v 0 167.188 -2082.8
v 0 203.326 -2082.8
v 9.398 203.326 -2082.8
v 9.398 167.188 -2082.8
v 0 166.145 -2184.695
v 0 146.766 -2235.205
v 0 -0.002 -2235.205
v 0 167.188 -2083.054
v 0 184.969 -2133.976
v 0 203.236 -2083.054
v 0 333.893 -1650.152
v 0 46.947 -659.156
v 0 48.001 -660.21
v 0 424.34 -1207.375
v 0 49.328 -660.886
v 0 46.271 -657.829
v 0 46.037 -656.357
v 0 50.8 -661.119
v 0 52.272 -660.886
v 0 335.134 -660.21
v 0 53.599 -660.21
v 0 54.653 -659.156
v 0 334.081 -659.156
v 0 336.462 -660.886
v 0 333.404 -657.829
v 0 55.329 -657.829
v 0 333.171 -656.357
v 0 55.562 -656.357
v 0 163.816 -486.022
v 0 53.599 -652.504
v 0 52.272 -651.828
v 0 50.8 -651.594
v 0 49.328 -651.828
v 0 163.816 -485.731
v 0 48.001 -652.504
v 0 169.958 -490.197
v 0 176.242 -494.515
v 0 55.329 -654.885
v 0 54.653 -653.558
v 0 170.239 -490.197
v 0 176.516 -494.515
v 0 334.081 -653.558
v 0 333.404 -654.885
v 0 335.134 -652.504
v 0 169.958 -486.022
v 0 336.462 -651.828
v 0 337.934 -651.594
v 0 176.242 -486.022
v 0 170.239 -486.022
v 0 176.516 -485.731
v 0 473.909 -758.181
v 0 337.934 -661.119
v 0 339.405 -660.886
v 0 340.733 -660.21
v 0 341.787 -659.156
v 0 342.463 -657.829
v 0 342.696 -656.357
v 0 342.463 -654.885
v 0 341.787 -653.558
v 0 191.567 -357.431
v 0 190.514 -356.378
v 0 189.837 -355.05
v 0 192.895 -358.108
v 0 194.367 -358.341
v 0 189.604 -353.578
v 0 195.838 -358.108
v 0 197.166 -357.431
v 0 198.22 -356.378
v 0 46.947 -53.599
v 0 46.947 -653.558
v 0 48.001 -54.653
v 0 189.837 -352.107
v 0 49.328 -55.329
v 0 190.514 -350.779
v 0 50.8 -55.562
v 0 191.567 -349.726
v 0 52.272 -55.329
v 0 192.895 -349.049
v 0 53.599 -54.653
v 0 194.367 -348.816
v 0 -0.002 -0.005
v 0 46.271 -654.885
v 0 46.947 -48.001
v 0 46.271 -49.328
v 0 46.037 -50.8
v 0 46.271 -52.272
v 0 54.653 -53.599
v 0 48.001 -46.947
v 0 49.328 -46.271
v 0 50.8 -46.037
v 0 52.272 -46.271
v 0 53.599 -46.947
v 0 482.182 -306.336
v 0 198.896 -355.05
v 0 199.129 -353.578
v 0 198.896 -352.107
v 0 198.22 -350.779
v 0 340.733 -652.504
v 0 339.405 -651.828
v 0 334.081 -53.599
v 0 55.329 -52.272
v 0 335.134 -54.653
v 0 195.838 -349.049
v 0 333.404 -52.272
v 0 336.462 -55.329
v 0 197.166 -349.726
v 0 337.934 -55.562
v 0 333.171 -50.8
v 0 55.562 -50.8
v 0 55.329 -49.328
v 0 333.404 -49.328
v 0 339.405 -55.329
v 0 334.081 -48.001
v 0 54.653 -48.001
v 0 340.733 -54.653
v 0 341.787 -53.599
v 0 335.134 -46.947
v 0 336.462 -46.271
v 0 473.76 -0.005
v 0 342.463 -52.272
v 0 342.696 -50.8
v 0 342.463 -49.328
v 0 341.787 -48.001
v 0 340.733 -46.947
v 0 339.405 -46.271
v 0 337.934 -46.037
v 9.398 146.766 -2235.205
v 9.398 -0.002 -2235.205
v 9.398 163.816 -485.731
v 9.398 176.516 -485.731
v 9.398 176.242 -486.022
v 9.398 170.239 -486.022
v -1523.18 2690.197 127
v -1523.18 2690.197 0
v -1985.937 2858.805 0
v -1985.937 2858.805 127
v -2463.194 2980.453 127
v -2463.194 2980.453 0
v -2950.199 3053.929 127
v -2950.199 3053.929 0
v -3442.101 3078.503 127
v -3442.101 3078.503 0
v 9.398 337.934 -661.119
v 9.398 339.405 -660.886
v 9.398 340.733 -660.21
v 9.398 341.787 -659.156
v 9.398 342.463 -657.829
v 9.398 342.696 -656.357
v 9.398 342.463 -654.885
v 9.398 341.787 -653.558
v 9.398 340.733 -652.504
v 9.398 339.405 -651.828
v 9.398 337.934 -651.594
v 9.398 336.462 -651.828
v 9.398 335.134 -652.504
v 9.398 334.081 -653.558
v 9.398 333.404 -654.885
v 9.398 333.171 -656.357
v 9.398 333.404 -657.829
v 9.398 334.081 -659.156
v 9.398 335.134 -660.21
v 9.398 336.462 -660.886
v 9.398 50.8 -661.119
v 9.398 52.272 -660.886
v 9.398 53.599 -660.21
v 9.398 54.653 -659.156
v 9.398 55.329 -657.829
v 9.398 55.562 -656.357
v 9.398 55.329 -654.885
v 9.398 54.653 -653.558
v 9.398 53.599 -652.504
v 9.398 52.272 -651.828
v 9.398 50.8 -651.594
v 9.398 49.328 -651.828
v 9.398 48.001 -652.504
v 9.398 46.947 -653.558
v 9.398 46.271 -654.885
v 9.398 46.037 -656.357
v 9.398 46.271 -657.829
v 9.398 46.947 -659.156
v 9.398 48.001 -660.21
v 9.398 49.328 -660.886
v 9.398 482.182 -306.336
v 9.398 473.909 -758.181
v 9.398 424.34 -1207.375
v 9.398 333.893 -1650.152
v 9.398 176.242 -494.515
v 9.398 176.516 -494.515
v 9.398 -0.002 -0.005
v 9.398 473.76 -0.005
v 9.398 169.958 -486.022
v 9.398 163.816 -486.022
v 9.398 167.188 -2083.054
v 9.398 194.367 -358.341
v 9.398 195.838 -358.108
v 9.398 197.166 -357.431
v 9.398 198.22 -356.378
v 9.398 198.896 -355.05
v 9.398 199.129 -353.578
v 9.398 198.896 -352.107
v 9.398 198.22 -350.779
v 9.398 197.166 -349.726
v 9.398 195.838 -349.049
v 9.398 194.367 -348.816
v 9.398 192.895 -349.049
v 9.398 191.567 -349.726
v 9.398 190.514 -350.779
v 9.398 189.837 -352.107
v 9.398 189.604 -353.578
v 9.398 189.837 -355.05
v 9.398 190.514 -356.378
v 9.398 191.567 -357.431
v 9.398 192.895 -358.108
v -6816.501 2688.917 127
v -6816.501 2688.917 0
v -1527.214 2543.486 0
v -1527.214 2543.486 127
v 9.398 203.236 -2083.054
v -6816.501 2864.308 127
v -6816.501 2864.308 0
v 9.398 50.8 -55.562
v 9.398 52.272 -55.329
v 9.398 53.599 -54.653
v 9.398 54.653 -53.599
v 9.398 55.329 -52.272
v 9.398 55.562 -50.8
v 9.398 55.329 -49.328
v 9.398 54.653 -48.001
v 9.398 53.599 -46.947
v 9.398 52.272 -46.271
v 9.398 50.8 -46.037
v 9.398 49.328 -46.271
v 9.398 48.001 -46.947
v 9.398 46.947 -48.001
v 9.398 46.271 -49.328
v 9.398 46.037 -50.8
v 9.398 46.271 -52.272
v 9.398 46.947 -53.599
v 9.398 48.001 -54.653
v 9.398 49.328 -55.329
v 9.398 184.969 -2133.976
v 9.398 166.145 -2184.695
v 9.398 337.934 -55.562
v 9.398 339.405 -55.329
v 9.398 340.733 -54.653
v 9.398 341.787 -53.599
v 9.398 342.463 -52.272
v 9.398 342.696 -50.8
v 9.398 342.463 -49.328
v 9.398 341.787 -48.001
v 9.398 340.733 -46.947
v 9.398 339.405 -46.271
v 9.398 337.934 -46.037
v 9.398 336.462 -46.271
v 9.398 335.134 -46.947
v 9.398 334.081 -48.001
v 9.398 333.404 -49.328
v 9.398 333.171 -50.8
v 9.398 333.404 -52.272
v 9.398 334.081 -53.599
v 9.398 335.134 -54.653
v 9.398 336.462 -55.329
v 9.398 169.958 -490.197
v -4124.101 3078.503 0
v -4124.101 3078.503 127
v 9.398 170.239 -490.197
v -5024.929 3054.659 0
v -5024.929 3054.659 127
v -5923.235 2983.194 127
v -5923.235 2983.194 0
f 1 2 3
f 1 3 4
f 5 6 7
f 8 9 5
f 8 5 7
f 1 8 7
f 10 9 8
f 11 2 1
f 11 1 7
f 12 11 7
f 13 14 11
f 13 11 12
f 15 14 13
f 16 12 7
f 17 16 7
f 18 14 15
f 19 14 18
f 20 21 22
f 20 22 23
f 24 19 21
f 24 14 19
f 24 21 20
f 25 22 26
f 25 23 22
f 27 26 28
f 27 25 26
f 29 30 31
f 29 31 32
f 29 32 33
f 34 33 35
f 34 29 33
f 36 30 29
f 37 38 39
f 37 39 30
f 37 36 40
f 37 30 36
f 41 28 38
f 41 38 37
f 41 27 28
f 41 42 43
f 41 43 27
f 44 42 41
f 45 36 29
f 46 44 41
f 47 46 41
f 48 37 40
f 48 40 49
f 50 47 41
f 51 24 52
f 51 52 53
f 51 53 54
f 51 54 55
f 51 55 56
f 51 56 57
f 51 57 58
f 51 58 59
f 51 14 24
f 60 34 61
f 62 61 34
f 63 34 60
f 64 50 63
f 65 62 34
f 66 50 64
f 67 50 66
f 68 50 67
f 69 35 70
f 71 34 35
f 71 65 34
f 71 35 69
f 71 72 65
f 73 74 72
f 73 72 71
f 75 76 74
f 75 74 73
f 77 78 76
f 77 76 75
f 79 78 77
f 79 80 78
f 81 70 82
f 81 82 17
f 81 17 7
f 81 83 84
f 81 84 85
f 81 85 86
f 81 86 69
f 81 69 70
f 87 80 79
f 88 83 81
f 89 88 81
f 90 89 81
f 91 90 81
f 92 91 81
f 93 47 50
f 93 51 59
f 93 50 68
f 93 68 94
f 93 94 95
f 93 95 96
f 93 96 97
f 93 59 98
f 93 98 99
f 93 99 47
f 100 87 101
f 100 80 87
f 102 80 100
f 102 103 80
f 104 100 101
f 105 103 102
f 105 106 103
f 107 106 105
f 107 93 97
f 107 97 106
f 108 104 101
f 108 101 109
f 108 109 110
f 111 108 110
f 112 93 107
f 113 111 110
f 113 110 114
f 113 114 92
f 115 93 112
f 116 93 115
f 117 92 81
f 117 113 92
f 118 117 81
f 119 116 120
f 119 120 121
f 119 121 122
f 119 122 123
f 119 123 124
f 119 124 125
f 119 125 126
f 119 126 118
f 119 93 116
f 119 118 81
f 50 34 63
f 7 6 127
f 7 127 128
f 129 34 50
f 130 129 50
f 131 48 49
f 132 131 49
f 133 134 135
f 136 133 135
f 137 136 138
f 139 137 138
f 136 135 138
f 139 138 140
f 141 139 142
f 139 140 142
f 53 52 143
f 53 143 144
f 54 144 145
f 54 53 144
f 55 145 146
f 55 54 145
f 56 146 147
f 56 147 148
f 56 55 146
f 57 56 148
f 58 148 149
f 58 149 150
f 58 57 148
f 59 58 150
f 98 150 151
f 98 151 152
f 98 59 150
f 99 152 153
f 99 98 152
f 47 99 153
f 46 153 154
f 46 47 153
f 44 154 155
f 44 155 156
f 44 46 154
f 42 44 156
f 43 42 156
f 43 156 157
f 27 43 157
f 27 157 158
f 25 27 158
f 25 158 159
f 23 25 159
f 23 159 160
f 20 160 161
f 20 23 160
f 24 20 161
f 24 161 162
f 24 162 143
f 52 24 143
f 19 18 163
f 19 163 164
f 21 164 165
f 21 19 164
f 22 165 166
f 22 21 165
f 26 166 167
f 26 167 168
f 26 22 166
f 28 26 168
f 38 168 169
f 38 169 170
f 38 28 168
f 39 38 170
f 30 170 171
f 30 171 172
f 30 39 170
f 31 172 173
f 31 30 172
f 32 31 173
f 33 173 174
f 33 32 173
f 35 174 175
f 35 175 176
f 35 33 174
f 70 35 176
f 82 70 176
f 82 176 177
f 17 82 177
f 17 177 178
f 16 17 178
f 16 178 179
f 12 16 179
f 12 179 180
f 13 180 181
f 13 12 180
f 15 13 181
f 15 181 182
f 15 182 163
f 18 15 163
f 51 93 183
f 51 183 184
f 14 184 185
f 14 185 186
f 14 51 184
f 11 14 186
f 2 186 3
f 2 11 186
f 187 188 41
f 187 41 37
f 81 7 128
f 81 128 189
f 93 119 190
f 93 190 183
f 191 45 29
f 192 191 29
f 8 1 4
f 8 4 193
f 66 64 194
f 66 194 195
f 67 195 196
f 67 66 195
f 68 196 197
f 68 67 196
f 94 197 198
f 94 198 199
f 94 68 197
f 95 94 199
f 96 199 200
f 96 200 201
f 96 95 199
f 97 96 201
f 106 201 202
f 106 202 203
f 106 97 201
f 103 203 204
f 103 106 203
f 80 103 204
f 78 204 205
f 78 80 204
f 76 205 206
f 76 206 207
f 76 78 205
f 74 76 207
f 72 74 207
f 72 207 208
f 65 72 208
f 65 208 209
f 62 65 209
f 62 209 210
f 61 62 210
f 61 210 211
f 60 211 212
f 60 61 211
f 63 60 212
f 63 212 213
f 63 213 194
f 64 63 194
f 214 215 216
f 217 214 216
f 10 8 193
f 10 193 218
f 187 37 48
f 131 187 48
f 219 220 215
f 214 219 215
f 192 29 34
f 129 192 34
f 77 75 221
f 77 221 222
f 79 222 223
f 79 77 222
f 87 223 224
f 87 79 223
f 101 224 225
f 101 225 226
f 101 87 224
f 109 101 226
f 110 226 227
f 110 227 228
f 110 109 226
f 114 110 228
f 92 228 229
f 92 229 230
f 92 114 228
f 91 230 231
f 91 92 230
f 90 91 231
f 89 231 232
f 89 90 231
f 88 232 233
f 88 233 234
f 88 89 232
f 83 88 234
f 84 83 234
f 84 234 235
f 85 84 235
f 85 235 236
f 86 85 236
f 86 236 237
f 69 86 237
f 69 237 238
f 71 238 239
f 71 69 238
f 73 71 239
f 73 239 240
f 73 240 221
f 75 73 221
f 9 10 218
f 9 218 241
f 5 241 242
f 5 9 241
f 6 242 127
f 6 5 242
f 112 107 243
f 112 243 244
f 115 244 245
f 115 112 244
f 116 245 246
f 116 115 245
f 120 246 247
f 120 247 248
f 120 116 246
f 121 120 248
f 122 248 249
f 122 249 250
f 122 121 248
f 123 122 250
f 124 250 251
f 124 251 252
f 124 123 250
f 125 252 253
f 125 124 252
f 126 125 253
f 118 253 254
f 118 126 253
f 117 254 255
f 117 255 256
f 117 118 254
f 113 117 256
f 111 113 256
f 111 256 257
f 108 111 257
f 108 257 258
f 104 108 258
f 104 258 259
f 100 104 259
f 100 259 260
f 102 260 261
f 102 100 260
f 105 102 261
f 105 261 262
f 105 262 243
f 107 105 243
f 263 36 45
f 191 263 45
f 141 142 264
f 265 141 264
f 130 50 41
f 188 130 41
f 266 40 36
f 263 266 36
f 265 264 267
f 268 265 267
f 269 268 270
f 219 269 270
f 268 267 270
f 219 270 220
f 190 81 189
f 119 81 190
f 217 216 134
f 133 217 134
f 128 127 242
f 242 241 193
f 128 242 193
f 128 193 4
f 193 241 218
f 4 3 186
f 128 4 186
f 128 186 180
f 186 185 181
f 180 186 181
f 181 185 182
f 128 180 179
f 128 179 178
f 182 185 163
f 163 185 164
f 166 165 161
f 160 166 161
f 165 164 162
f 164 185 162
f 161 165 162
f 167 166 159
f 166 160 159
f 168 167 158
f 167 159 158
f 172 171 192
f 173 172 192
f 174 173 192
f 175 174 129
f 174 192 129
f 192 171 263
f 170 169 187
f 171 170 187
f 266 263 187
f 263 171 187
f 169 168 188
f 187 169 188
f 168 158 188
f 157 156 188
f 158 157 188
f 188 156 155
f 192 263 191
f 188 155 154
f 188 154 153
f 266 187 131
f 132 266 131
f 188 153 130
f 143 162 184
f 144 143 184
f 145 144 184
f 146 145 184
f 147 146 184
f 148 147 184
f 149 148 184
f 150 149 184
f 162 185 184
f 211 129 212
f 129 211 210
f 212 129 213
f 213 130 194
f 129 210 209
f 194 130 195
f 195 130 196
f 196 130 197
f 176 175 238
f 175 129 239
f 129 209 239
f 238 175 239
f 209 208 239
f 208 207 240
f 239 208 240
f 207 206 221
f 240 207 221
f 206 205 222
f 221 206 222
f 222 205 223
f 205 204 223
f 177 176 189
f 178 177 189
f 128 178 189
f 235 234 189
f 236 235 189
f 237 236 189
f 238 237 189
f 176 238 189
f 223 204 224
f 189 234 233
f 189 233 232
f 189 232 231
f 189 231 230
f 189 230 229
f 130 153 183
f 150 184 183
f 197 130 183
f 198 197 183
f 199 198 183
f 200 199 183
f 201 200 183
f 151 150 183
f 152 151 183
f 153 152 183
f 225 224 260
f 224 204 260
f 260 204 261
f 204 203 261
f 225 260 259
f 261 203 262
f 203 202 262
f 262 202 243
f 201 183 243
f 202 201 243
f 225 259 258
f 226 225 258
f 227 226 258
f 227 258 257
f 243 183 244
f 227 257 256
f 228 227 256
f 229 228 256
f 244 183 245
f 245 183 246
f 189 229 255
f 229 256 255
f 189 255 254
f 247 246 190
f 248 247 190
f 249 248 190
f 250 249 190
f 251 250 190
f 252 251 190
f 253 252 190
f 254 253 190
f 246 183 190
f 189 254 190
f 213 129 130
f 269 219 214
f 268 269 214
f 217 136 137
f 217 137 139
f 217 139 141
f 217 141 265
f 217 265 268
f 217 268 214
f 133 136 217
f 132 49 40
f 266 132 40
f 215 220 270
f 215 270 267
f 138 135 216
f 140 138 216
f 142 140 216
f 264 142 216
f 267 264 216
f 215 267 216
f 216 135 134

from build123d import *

# Parameters (mm, degrees)
BOSS_EXTRUDE1_DEPTH = 127
SKETCH2_R           = 4.7625
BOSS_EXTRUDE2_DEPTH = 9.398


with BuildPart() as part:
    # Sketch1 → Boss-Extrude1 (new body)
    with BuildSketch(Plane.XY):
        with BuildLine():
            Line((-6816.501384736, 2864.308180535), (-6816.501384736, 2688.917247583))
            Line((-6816.501384736, 2688.917247583), (-1527.214280962, 2543.485601502))
            Line((-1527.214280962, 2543.485601502), (-1523.180364096, 2690.197441952))
            ThreePointArc((-1523.180364096, 2690.197441952), (-2463.193969456, 2980.452507773), (-3442.101384736, 3078.502769387))
            Line((-3442.101384736, 3078.502769387), (-4124.101384736, 3078.502769387))
            ThreePointArc((-4124.101384736, 3078.502769387), (-5474.554742122, 3024.869661361), (-6816.501384736, 2864.308180535))
        make_face()
    extrude(amount=BOSS_EXTRUDE1_DEPTH)


with BuildPart() as body_2:
    # Sketch2 → Boss-Extrude2 (new body)
    with BuildSketch(Plane(origin=(0, 0, 0), x_dir=(0, 0, -1), z_dir=(1, 0, 0))):
        with BuildLine():
            Line((0.004738377, 473.759742407), (306.336040574, 482.182478791))
            ThreePointArc((306.336040574, 482.182478791), (1207.374867605, 424.340411932), (2082.799998861, 203.325679209))
            Line((2082.799998861, 203.325679209), (2082.799998861, 167.187967798))
            Line((2082.799998861, 167.187967798), (2083.053998861, 167.187967798))
            Line((2083.053998861, 167.187967798), (2083.053998861, 203.236138383))
            ThreePointArc((2083.053998861, 203.236138383), (2159.361491956, 175.626305447), (2235.204738323, 146.76563398))
            Line((2235.204738323, 146.76563398), (2235.204738377, -0.001670525))
            Line((2235.204738377, -0.001670525), (0.004738377, -0.001670525))
            Line((0.004738377, -0.001670525), (0.004738377, 473.759742407))
        make_face()
        with Locations((656.356957587, 337.933597897)):
            Circle(SKETCH2_R, mode=Mode.SUBTRACT)
        with Locations((656.356957587, 50.8)):
            Circle(SKETCH2_R, mode=Mode.SUBTRACT)
        with Locations((50.8, 50.8)):
            Circle(SKETCH2_R, mode=Mode.SUBTRACT)
        with Locations((50.8, 337.933597897)):
            Circle(SKETCH2_R, mode=Mode.SUBTRACT)
        with Locations((353.578478793, 194.366798948)):
            Circle(SKETCH2_R, mode=Mode.SUBTRACT)
        Polygon((494.514909268, 176.24223961), (486.022286641, 176.24223961), (486.022286641, 170.238877268), (490.197009742, 170.238877268), (490.197009742, 169.957548154), (486.022286641, 169.957548154), (486.022286641, 163.816033122), (485.730910059, 163.816033122), (485.730910059, 176.516033122), (494.514909268, 176.516033122), align=None, mode=Mode.SUBTRACT)
    extrude(amount=BOSS_EXTRUDE2_DEPTH)


solid = Compound([part.part, body_2.part])
